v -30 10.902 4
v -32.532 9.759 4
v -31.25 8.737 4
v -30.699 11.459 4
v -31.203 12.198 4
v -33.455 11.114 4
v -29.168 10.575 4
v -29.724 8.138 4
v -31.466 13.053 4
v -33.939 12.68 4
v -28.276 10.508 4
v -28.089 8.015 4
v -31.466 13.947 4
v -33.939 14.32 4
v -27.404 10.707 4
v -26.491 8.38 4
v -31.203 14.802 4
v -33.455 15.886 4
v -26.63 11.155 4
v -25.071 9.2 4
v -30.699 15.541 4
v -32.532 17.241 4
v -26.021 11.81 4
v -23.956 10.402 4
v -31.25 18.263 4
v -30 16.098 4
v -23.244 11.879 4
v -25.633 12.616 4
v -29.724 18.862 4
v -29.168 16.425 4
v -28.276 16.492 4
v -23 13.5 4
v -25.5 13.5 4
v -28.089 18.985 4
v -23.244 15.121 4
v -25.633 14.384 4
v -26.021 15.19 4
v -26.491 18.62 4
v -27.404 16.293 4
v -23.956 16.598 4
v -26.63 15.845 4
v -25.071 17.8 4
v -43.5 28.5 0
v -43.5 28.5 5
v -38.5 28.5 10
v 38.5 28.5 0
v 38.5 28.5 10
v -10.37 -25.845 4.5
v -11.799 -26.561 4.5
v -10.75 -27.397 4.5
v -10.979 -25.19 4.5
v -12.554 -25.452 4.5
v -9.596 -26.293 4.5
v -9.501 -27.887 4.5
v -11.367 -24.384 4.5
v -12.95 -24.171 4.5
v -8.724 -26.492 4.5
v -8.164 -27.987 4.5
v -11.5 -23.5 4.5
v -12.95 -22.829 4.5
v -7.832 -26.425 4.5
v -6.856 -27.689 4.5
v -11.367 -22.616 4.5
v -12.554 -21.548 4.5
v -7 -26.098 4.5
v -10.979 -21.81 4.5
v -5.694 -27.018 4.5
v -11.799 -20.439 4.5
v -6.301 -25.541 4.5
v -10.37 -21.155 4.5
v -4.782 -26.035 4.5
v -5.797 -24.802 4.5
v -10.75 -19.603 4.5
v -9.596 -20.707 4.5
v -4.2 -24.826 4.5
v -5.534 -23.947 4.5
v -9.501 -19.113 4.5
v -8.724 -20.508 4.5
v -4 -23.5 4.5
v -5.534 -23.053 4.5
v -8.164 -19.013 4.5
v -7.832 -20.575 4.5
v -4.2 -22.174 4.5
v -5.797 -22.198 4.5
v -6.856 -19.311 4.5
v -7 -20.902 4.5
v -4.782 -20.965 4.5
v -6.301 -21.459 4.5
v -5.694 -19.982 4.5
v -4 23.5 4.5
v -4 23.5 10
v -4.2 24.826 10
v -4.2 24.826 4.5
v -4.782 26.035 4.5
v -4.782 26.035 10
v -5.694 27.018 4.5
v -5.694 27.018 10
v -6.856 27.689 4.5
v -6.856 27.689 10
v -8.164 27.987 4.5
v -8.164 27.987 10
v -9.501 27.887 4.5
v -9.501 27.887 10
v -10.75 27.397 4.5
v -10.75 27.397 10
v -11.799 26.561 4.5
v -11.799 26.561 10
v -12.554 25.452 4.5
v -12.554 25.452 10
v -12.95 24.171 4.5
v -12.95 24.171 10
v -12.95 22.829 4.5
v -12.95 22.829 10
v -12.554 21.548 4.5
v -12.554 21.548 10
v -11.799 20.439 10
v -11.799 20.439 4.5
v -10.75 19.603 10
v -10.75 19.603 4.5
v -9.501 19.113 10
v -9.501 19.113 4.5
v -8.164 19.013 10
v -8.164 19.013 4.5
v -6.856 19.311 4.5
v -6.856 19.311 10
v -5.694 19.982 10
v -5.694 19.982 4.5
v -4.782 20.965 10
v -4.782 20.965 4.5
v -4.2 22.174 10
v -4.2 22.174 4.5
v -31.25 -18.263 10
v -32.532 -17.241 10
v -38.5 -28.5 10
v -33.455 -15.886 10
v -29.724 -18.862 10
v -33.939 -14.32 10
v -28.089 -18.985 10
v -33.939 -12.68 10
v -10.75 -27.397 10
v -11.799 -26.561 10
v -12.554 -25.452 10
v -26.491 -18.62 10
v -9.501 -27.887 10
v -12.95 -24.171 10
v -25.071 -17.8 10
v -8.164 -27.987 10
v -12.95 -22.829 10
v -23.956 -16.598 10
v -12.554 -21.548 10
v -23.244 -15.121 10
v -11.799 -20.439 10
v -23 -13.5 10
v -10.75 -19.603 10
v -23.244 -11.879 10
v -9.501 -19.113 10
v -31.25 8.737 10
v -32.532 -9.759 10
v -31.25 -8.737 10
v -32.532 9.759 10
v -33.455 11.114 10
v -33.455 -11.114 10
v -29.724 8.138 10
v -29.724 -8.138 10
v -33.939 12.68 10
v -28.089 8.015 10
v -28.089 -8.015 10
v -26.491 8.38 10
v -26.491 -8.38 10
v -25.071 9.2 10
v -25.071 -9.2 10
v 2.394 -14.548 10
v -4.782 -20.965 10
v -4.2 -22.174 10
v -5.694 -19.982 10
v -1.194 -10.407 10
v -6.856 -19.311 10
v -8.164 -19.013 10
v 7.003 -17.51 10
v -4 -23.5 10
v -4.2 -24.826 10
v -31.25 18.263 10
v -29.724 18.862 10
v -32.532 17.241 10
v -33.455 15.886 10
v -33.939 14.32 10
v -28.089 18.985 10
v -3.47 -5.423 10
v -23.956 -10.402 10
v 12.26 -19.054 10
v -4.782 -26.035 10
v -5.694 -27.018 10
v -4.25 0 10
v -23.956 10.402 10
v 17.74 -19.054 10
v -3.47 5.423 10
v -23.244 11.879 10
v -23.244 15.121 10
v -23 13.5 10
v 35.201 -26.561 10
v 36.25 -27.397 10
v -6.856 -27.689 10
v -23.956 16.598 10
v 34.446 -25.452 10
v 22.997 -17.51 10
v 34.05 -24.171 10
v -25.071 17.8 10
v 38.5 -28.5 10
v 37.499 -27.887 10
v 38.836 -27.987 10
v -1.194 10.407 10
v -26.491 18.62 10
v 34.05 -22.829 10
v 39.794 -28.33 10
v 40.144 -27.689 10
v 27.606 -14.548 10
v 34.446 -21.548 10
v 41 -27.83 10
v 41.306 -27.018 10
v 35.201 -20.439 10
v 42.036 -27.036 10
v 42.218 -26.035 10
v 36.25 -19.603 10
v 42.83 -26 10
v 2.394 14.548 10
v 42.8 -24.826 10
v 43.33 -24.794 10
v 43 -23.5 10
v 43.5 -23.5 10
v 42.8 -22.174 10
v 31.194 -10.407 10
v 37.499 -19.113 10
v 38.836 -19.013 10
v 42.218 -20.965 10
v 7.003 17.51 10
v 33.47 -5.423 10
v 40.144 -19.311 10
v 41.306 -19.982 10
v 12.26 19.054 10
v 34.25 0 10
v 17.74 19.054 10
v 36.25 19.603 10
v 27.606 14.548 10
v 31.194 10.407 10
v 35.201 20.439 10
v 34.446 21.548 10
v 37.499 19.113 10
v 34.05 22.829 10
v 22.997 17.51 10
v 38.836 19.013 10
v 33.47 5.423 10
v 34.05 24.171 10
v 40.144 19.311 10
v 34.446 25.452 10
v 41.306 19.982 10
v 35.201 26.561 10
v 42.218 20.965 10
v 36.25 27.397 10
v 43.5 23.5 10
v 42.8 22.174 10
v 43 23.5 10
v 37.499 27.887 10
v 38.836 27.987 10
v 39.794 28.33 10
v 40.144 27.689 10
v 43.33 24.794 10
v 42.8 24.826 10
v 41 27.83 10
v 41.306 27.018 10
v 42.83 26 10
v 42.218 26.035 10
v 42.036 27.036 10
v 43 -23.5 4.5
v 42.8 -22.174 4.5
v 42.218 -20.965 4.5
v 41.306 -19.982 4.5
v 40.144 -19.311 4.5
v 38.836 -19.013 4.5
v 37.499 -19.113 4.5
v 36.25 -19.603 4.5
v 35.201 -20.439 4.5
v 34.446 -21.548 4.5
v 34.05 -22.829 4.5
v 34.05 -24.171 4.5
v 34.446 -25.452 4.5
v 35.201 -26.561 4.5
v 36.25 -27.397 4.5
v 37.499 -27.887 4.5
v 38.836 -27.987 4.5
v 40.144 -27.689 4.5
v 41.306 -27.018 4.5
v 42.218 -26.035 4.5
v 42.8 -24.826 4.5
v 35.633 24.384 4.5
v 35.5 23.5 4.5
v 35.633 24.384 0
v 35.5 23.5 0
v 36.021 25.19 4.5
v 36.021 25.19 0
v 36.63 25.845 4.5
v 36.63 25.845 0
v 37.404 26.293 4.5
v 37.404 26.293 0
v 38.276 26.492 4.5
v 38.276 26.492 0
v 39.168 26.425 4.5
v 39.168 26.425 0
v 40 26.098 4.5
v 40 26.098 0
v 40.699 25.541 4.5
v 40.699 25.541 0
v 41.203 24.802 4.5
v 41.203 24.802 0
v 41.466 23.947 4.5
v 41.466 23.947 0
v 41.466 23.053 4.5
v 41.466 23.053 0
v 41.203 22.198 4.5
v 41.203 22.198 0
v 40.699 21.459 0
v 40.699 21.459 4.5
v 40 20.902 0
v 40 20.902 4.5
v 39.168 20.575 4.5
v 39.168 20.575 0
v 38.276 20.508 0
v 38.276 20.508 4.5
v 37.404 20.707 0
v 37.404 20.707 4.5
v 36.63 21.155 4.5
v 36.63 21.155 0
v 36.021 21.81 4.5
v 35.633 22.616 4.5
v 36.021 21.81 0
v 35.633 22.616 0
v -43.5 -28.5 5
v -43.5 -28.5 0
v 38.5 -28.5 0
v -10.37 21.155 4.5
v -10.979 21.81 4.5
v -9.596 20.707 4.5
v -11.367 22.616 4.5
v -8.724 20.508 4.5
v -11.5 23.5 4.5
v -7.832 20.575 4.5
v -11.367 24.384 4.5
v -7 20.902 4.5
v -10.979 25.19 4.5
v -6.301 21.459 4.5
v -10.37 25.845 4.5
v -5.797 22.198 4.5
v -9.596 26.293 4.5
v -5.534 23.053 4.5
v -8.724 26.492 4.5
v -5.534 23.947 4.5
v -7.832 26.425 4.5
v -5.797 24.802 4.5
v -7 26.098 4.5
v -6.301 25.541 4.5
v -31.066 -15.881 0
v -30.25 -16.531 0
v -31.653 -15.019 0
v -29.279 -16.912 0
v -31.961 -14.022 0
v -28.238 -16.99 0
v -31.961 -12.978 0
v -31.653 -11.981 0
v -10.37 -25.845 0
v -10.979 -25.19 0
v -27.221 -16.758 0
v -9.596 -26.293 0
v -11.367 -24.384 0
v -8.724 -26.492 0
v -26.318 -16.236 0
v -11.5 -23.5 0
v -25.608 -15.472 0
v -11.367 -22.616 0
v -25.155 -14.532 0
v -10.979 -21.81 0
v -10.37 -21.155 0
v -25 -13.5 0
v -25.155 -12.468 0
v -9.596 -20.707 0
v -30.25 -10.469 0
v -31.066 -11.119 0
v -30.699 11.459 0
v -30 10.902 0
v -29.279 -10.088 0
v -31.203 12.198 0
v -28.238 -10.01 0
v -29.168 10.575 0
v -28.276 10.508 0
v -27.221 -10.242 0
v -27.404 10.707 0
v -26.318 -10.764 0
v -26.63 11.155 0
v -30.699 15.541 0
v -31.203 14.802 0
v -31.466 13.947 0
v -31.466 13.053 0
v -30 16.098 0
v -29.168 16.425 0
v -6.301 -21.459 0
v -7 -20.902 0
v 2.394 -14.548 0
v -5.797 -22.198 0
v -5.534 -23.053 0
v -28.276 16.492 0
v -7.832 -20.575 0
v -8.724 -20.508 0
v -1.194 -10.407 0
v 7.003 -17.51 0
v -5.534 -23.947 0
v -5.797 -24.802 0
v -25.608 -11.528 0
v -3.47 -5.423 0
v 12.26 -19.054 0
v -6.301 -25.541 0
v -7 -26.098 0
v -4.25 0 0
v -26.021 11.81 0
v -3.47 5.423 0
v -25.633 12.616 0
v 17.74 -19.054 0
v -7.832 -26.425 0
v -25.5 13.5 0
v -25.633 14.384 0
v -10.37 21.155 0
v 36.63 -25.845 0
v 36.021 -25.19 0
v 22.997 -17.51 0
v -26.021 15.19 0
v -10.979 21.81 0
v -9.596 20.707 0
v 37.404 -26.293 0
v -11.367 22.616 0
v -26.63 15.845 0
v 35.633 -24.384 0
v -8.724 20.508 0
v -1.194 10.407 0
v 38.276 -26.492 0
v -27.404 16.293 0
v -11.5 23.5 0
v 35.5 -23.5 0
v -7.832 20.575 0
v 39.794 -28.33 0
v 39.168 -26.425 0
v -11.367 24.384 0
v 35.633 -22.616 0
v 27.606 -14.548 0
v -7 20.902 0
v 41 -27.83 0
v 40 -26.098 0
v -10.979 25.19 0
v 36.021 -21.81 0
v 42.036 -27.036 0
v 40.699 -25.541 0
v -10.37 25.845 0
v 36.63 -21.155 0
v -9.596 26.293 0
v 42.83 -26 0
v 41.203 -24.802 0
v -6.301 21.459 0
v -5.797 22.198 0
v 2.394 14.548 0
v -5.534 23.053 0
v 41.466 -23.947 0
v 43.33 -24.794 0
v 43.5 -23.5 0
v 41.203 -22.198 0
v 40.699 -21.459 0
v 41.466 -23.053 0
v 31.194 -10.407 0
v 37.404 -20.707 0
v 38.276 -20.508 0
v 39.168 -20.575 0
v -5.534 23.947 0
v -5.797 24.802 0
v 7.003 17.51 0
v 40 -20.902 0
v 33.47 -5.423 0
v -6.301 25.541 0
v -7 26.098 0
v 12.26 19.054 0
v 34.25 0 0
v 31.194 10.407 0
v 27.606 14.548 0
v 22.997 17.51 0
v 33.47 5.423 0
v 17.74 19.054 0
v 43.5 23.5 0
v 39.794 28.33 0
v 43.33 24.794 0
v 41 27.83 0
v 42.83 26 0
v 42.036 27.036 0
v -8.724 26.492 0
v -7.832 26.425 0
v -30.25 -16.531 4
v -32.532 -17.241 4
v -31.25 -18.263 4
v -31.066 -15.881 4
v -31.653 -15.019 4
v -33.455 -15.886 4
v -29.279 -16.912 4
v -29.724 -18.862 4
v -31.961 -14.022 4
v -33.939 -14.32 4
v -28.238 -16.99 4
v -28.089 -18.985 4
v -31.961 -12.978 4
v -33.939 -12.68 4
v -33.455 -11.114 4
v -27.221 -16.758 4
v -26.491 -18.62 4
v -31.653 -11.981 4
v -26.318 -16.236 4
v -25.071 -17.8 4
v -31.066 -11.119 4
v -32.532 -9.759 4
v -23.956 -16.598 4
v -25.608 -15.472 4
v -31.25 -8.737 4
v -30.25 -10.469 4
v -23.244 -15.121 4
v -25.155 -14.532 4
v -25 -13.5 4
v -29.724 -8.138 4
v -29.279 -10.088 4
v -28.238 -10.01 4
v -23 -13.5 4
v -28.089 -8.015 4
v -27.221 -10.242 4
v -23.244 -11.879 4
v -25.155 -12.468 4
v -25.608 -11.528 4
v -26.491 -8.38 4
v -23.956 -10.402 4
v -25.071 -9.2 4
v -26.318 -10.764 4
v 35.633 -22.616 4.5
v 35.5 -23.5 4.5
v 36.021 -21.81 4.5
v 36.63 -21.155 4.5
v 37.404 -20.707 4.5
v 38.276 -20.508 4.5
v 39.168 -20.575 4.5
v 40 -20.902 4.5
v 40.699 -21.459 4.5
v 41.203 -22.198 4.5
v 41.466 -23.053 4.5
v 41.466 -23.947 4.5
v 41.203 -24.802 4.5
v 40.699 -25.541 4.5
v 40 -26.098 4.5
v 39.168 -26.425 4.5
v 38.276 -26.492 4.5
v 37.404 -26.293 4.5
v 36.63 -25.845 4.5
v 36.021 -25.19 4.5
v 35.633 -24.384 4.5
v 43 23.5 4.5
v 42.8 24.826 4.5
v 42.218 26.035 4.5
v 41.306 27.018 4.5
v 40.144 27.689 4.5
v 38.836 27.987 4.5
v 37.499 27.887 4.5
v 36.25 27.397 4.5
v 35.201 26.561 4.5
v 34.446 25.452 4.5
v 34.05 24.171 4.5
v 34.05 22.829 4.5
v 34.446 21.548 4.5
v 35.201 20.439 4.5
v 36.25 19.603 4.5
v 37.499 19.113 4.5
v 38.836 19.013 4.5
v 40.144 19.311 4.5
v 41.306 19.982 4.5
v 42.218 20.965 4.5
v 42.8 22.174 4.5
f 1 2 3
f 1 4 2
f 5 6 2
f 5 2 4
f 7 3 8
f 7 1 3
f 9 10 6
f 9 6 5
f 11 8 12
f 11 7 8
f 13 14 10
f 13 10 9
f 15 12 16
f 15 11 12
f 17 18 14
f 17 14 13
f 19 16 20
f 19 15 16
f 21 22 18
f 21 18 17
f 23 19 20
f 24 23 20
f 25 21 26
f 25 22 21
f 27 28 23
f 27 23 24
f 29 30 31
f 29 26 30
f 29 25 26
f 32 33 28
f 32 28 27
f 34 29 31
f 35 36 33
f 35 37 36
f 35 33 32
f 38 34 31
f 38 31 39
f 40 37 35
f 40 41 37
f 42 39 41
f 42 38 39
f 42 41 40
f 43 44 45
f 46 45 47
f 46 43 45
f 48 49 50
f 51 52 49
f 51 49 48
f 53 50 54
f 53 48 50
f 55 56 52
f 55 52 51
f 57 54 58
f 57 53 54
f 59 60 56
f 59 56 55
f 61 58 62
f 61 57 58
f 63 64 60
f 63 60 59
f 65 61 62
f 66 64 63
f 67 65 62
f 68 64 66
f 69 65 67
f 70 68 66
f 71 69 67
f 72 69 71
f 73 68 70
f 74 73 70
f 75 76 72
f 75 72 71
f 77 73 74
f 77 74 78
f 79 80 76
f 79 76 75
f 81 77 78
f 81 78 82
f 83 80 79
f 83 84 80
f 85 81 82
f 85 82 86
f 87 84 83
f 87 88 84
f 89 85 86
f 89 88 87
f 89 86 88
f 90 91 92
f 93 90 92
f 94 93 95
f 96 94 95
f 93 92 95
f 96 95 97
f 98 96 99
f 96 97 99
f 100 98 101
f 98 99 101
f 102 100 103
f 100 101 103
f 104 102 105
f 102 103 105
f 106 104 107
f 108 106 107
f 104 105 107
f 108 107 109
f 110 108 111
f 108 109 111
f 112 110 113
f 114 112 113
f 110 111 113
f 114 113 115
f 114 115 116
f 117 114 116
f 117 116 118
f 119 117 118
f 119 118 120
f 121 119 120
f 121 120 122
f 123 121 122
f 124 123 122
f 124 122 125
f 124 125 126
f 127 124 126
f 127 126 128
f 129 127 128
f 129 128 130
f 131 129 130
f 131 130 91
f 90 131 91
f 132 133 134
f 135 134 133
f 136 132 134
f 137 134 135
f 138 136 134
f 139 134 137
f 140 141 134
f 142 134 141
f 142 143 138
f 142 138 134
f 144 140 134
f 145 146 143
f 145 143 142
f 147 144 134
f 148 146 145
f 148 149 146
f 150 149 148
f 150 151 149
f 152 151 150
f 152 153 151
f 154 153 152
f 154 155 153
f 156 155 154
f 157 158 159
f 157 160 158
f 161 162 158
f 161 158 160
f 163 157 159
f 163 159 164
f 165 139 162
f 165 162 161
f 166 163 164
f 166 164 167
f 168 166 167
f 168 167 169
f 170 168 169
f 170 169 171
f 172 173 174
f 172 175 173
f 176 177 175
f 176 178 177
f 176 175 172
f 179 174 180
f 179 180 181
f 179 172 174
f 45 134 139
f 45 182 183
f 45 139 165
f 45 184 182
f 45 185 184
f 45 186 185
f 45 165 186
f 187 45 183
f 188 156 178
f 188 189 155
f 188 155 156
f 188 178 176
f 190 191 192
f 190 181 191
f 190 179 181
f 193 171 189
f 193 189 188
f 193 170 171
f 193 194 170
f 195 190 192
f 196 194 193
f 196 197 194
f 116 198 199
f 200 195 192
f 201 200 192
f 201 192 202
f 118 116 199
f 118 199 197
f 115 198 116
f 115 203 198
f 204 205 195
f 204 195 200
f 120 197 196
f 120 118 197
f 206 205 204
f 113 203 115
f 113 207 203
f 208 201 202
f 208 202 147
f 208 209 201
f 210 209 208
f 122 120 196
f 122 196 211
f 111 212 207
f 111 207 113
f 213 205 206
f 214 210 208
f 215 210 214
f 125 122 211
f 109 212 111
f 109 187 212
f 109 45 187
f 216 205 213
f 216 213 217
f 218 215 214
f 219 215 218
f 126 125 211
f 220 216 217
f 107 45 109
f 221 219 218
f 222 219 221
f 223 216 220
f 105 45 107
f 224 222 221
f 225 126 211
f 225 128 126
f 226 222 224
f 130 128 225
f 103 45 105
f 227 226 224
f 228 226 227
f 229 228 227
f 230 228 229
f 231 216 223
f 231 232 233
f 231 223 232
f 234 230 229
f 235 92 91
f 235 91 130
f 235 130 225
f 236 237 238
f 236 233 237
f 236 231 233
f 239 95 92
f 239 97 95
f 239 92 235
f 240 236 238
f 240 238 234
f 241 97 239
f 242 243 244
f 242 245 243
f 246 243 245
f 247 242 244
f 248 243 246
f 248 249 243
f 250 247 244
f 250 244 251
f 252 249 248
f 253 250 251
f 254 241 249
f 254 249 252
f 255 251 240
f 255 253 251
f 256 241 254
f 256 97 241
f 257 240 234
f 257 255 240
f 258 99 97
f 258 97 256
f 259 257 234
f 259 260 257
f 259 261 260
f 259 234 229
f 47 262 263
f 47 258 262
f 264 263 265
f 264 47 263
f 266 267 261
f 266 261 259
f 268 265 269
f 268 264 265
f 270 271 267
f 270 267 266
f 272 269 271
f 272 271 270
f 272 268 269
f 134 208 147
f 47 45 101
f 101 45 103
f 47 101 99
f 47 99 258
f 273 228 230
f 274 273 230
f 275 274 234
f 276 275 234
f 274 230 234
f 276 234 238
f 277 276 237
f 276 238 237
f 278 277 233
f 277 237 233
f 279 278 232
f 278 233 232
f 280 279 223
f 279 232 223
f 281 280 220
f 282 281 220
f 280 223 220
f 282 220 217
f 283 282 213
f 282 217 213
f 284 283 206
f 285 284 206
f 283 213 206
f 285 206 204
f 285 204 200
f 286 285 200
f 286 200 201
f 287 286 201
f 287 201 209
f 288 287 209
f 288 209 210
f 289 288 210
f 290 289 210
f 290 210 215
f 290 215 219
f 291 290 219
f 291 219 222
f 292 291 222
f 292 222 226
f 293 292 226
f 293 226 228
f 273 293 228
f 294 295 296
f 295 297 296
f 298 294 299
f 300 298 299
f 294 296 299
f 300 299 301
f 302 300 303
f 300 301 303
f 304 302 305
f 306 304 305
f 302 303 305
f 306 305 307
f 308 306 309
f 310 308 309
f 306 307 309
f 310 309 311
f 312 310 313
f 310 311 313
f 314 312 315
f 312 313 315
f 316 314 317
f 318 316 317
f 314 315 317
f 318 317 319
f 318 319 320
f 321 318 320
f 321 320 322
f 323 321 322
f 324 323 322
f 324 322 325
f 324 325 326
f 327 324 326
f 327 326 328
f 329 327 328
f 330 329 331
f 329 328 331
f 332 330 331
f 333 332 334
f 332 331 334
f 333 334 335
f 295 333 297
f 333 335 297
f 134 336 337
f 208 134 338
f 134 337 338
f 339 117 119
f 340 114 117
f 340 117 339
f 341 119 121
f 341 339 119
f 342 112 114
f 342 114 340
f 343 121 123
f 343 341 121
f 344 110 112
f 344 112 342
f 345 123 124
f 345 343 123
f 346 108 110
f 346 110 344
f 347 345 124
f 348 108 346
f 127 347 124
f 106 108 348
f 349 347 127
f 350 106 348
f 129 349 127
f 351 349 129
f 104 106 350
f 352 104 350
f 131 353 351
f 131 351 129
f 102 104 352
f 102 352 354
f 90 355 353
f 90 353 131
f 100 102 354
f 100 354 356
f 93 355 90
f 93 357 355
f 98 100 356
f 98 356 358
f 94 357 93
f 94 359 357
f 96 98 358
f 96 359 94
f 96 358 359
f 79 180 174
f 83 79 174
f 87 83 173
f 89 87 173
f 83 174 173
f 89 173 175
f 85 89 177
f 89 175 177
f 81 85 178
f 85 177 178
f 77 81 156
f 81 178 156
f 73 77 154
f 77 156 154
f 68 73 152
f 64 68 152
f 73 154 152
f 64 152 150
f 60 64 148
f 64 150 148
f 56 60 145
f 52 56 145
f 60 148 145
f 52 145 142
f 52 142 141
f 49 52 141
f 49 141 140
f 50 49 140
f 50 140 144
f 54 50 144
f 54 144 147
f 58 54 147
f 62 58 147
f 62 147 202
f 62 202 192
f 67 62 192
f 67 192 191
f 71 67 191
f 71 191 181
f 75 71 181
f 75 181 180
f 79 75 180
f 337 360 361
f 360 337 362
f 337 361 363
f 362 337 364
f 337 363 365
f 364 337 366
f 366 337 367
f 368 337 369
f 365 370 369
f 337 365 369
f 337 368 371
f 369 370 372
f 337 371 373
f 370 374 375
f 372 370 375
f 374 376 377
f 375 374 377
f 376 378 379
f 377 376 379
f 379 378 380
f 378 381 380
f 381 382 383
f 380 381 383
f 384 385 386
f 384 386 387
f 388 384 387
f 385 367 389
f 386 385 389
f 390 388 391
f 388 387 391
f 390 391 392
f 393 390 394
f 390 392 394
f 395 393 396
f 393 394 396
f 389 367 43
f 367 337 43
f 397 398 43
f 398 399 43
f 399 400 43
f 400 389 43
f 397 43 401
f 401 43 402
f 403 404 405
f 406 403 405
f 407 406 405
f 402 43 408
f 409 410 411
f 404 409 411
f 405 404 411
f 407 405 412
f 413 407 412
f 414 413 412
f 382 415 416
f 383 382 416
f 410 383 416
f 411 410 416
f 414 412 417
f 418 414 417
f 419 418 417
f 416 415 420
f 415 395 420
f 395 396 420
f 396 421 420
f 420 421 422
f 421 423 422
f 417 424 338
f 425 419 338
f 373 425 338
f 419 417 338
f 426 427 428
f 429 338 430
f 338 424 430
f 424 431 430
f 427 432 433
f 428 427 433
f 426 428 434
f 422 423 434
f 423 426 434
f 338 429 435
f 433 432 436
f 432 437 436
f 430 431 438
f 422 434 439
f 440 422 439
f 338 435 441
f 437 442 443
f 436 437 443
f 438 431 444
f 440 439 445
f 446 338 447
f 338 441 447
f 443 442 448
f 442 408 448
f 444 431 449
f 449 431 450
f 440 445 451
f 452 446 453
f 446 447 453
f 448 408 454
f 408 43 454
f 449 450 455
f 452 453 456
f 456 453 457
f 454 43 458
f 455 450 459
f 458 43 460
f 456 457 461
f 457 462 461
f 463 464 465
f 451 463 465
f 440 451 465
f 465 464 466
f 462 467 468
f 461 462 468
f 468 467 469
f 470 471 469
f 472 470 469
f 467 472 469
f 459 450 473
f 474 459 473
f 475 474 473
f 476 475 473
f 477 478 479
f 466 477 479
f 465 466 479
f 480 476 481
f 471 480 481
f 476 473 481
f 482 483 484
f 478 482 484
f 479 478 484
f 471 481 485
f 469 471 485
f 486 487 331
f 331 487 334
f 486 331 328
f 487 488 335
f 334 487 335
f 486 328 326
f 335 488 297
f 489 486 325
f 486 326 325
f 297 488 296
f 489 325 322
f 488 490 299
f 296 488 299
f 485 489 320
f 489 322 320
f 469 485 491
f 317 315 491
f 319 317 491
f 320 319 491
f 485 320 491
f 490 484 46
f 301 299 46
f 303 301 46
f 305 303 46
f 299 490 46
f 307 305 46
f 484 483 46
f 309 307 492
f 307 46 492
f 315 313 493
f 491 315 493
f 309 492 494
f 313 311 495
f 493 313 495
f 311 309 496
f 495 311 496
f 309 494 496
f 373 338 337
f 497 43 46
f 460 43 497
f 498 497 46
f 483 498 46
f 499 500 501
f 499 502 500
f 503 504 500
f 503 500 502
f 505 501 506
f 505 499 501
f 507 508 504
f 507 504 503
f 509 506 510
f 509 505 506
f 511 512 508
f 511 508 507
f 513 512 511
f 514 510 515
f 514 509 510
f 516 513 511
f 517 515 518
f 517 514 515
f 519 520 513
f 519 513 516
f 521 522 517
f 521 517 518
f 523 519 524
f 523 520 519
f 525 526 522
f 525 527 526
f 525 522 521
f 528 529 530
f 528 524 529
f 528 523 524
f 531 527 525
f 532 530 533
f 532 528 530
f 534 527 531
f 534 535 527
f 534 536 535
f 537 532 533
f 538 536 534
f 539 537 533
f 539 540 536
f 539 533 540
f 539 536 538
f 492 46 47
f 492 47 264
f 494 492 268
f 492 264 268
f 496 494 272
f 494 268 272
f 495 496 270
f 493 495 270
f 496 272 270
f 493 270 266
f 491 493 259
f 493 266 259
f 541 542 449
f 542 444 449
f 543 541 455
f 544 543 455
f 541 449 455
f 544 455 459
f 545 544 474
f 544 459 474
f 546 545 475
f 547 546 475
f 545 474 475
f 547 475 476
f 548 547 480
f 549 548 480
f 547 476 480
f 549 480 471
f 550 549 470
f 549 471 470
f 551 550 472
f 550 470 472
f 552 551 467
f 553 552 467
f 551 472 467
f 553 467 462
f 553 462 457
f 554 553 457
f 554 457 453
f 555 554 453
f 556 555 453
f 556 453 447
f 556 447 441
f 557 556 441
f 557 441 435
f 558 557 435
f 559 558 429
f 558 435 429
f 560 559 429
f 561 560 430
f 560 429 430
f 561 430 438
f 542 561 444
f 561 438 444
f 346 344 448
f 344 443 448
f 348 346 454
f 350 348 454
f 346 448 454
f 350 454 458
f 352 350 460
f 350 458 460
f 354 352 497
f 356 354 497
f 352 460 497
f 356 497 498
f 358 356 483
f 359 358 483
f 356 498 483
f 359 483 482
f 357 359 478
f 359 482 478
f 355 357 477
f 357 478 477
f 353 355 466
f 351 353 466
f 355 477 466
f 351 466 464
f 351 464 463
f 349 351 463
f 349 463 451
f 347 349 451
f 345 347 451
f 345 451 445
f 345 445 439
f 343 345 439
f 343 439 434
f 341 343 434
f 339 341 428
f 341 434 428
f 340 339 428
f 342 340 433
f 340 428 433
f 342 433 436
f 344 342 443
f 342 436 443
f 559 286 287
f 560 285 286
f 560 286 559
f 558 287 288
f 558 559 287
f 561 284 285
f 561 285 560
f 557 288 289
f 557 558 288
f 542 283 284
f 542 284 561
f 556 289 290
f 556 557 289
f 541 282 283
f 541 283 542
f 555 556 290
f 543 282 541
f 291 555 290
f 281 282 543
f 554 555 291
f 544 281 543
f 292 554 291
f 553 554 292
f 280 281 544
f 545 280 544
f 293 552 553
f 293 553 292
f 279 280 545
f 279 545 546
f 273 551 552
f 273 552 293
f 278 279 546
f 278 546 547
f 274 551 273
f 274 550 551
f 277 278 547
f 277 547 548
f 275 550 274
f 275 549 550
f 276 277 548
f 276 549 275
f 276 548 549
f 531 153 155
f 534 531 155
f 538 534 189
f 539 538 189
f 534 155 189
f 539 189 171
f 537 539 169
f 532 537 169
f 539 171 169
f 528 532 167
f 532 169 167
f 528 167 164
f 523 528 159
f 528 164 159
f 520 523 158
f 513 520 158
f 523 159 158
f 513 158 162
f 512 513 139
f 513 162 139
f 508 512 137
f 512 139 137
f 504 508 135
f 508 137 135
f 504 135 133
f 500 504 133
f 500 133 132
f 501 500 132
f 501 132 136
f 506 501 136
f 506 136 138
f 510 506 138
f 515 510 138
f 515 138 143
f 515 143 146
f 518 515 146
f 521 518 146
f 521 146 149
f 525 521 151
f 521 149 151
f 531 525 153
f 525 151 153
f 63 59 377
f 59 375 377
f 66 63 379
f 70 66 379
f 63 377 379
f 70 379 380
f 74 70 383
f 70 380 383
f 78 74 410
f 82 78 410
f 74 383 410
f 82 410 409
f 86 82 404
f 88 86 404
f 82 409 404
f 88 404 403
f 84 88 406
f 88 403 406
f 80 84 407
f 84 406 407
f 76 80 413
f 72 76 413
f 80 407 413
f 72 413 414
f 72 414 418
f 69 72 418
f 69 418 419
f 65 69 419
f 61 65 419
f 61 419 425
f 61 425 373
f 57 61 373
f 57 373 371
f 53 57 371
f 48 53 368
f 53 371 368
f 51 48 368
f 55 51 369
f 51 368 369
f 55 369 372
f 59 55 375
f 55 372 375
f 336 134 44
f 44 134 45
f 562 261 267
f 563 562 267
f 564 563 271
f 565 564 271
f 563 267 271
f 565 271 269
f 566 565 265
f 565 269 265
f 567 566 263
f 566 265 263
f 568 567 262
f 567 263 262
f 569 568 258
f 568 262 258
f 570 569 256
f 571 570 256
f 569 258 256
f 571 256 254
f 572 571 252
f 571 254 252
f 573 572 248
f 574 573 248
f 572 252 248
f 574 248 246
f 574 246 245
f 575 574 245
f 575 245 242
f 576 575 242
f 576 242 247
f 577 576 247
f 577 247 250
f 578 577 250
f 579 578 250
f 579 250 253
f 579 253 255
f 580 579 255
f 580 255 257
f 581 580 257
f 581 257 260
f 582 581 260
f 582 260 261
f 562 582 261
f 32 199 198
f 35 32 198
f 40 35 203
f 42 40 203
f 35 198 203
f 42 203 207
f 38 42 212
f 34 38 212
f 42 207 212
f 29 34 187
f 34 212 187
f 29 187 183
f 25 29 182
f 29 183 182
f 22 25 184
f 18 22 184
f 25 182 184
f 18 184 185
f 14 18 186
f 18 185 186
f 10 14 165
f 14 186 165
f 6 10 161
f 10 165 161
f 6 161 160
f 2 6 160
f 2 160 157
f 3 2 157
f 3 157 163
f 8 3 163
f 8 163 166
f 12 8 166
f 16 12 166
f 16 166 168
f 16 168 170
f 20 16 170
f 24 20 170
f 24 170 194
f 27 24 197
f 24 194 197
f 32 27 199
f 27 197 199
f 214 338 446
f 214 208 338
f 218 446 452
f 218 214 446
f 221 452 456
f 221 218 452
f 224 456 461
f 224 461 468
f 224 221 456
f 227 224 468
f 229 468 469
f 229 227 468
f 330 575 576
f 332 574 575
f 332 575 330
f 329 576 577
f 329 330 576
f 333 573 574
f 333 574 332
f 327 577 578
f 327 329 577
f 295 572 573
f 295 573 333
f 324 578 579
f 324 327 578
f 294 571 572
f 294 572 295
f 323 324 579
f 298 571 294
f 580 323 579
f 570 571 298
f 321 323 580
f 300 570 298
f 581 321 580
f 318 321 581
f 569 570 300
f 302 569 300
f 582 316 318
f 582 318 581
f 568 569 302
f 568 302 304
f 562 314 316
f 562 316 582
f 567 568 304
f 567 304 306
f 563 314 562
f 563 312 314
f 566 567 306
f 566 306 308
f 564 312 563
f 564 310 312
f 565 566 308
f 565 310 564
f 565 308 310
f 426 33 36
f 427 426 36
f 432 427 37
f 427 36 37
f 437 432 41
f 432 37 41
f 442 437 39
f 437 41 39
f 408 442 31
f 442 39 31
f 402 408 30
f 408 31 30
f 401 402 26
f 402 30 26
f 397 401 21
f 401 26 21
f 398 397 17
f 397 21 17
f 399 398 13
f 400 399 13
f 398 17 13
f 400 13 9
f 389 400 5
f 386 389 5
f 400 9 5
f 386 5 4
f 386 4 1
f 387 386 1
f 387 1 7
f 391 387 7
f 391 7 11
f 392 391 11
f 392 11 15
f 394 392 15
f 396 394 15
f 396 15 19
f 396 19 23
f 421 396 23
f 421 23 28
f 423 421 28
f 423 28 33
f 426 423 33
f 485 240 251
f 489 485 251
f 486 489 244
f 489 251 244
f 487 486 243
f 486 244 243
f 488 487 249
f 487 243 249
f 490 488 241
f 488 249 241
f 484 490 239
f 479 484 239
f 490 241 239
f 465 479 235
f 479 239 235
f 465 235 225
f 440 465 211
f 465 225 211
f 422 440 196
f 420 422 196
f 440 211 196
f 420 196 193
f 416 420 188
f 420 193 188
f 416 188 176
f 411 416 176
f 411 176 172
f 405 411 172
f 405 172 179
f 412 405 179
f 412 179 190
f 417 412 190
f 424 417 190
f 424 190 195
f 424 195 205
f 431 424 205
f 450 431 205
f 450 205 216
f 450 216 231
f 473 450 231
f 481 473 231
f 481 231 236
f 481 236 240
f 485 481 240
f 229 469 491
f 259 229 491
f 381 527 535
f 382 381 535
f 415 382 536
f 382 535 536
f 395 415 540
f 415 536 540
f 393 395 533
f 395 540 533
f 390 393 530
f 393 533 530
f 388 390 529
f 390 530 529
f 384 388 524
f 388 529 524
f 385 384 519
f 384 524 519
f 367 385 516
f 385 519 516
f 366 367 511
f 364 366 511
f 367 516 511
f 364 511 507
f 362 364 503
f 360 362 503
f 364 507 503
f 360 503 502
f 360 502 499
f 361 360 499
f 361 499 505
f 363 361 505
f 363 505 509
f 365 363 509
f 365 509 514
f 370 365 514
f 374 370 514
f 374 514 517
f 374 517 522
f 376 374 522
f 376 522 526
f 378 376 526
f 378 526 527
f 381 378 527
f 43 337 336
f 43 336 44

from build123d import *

# Parameters (mm, degrees)
F0_W           = 87
F0_H           = 57
F1_DEPTH       = 10
F2_R           = 19.25
F2_R_2         = 3
F2_R_3         = 3.5
F3_DEPTH       = 10.001
F5_R           = 5.5
F6_DEPTH       = 6
F7_D           = 6
F7_CBORE_D     = 9
F7_CBORE_DEPTH = 5.5
F8_R           = 5
F9_SIZE        = 5


with BuildPart() as f1:
    # F0 (on Top) → F1 (new body)
    with BuildSketch(Plane.XY):
        Rectangle(F0_W, F0_H)
    extrude(amount=F1_DEPTH)

    # F2 (on face) → F3 (cut, through all)
    with BuildSketch(Plane.XY.offset(10)):
        with Locations((15, 0)):
            Circle(F2_R)
        with Locations((-28.5, 13.5)):
            Circle(F2_R_2)
        with Locations((-28.5, -13.5)):
            Circle(F2_R_3)
    extrude(amount=-F3_DEPTH, mode=Mode.SUBTRACT)

    # F5 (on face) → F6 (cut)
    with BuildSketch(Plane.XY.offset(10)):
        with Locations((-28.5, 13.5)):
            Circle(F5_R)
        with Locations((-28.5, -13.5)):
            Circle(F5_R)
    extrude(amount=-F6_DEPTH, mode=Mode.SUBTRACT)

    # F7 (through all)
    with Locations(Plane.XY.offset(10)):
        with Locations((-8.5, 23.5), (38.5, 23.5), (38.5, -23.5), (-8.5, -23.5)):
            CounterBoreHole(F7_D / 2, F7_CBORE_D / 2, F7_CBORE_DEPTH)

    # F8
    f8_edges = [f1.edges().sort_by_distance(p)[0] for p in [
        (43.5, -28.5, 5),
        (43.5, 28.5, 5),
    ]]
    fillet(f8_edges, radius=F8_R)

    # F9
    f9_edges = [f1.edges().sort_by_distance(p)[0] for p in [
        (-43.5, 0, 10),
    ]]
    chamfer(f9_edges, length=F9_SIZE)


solid = f1.part
